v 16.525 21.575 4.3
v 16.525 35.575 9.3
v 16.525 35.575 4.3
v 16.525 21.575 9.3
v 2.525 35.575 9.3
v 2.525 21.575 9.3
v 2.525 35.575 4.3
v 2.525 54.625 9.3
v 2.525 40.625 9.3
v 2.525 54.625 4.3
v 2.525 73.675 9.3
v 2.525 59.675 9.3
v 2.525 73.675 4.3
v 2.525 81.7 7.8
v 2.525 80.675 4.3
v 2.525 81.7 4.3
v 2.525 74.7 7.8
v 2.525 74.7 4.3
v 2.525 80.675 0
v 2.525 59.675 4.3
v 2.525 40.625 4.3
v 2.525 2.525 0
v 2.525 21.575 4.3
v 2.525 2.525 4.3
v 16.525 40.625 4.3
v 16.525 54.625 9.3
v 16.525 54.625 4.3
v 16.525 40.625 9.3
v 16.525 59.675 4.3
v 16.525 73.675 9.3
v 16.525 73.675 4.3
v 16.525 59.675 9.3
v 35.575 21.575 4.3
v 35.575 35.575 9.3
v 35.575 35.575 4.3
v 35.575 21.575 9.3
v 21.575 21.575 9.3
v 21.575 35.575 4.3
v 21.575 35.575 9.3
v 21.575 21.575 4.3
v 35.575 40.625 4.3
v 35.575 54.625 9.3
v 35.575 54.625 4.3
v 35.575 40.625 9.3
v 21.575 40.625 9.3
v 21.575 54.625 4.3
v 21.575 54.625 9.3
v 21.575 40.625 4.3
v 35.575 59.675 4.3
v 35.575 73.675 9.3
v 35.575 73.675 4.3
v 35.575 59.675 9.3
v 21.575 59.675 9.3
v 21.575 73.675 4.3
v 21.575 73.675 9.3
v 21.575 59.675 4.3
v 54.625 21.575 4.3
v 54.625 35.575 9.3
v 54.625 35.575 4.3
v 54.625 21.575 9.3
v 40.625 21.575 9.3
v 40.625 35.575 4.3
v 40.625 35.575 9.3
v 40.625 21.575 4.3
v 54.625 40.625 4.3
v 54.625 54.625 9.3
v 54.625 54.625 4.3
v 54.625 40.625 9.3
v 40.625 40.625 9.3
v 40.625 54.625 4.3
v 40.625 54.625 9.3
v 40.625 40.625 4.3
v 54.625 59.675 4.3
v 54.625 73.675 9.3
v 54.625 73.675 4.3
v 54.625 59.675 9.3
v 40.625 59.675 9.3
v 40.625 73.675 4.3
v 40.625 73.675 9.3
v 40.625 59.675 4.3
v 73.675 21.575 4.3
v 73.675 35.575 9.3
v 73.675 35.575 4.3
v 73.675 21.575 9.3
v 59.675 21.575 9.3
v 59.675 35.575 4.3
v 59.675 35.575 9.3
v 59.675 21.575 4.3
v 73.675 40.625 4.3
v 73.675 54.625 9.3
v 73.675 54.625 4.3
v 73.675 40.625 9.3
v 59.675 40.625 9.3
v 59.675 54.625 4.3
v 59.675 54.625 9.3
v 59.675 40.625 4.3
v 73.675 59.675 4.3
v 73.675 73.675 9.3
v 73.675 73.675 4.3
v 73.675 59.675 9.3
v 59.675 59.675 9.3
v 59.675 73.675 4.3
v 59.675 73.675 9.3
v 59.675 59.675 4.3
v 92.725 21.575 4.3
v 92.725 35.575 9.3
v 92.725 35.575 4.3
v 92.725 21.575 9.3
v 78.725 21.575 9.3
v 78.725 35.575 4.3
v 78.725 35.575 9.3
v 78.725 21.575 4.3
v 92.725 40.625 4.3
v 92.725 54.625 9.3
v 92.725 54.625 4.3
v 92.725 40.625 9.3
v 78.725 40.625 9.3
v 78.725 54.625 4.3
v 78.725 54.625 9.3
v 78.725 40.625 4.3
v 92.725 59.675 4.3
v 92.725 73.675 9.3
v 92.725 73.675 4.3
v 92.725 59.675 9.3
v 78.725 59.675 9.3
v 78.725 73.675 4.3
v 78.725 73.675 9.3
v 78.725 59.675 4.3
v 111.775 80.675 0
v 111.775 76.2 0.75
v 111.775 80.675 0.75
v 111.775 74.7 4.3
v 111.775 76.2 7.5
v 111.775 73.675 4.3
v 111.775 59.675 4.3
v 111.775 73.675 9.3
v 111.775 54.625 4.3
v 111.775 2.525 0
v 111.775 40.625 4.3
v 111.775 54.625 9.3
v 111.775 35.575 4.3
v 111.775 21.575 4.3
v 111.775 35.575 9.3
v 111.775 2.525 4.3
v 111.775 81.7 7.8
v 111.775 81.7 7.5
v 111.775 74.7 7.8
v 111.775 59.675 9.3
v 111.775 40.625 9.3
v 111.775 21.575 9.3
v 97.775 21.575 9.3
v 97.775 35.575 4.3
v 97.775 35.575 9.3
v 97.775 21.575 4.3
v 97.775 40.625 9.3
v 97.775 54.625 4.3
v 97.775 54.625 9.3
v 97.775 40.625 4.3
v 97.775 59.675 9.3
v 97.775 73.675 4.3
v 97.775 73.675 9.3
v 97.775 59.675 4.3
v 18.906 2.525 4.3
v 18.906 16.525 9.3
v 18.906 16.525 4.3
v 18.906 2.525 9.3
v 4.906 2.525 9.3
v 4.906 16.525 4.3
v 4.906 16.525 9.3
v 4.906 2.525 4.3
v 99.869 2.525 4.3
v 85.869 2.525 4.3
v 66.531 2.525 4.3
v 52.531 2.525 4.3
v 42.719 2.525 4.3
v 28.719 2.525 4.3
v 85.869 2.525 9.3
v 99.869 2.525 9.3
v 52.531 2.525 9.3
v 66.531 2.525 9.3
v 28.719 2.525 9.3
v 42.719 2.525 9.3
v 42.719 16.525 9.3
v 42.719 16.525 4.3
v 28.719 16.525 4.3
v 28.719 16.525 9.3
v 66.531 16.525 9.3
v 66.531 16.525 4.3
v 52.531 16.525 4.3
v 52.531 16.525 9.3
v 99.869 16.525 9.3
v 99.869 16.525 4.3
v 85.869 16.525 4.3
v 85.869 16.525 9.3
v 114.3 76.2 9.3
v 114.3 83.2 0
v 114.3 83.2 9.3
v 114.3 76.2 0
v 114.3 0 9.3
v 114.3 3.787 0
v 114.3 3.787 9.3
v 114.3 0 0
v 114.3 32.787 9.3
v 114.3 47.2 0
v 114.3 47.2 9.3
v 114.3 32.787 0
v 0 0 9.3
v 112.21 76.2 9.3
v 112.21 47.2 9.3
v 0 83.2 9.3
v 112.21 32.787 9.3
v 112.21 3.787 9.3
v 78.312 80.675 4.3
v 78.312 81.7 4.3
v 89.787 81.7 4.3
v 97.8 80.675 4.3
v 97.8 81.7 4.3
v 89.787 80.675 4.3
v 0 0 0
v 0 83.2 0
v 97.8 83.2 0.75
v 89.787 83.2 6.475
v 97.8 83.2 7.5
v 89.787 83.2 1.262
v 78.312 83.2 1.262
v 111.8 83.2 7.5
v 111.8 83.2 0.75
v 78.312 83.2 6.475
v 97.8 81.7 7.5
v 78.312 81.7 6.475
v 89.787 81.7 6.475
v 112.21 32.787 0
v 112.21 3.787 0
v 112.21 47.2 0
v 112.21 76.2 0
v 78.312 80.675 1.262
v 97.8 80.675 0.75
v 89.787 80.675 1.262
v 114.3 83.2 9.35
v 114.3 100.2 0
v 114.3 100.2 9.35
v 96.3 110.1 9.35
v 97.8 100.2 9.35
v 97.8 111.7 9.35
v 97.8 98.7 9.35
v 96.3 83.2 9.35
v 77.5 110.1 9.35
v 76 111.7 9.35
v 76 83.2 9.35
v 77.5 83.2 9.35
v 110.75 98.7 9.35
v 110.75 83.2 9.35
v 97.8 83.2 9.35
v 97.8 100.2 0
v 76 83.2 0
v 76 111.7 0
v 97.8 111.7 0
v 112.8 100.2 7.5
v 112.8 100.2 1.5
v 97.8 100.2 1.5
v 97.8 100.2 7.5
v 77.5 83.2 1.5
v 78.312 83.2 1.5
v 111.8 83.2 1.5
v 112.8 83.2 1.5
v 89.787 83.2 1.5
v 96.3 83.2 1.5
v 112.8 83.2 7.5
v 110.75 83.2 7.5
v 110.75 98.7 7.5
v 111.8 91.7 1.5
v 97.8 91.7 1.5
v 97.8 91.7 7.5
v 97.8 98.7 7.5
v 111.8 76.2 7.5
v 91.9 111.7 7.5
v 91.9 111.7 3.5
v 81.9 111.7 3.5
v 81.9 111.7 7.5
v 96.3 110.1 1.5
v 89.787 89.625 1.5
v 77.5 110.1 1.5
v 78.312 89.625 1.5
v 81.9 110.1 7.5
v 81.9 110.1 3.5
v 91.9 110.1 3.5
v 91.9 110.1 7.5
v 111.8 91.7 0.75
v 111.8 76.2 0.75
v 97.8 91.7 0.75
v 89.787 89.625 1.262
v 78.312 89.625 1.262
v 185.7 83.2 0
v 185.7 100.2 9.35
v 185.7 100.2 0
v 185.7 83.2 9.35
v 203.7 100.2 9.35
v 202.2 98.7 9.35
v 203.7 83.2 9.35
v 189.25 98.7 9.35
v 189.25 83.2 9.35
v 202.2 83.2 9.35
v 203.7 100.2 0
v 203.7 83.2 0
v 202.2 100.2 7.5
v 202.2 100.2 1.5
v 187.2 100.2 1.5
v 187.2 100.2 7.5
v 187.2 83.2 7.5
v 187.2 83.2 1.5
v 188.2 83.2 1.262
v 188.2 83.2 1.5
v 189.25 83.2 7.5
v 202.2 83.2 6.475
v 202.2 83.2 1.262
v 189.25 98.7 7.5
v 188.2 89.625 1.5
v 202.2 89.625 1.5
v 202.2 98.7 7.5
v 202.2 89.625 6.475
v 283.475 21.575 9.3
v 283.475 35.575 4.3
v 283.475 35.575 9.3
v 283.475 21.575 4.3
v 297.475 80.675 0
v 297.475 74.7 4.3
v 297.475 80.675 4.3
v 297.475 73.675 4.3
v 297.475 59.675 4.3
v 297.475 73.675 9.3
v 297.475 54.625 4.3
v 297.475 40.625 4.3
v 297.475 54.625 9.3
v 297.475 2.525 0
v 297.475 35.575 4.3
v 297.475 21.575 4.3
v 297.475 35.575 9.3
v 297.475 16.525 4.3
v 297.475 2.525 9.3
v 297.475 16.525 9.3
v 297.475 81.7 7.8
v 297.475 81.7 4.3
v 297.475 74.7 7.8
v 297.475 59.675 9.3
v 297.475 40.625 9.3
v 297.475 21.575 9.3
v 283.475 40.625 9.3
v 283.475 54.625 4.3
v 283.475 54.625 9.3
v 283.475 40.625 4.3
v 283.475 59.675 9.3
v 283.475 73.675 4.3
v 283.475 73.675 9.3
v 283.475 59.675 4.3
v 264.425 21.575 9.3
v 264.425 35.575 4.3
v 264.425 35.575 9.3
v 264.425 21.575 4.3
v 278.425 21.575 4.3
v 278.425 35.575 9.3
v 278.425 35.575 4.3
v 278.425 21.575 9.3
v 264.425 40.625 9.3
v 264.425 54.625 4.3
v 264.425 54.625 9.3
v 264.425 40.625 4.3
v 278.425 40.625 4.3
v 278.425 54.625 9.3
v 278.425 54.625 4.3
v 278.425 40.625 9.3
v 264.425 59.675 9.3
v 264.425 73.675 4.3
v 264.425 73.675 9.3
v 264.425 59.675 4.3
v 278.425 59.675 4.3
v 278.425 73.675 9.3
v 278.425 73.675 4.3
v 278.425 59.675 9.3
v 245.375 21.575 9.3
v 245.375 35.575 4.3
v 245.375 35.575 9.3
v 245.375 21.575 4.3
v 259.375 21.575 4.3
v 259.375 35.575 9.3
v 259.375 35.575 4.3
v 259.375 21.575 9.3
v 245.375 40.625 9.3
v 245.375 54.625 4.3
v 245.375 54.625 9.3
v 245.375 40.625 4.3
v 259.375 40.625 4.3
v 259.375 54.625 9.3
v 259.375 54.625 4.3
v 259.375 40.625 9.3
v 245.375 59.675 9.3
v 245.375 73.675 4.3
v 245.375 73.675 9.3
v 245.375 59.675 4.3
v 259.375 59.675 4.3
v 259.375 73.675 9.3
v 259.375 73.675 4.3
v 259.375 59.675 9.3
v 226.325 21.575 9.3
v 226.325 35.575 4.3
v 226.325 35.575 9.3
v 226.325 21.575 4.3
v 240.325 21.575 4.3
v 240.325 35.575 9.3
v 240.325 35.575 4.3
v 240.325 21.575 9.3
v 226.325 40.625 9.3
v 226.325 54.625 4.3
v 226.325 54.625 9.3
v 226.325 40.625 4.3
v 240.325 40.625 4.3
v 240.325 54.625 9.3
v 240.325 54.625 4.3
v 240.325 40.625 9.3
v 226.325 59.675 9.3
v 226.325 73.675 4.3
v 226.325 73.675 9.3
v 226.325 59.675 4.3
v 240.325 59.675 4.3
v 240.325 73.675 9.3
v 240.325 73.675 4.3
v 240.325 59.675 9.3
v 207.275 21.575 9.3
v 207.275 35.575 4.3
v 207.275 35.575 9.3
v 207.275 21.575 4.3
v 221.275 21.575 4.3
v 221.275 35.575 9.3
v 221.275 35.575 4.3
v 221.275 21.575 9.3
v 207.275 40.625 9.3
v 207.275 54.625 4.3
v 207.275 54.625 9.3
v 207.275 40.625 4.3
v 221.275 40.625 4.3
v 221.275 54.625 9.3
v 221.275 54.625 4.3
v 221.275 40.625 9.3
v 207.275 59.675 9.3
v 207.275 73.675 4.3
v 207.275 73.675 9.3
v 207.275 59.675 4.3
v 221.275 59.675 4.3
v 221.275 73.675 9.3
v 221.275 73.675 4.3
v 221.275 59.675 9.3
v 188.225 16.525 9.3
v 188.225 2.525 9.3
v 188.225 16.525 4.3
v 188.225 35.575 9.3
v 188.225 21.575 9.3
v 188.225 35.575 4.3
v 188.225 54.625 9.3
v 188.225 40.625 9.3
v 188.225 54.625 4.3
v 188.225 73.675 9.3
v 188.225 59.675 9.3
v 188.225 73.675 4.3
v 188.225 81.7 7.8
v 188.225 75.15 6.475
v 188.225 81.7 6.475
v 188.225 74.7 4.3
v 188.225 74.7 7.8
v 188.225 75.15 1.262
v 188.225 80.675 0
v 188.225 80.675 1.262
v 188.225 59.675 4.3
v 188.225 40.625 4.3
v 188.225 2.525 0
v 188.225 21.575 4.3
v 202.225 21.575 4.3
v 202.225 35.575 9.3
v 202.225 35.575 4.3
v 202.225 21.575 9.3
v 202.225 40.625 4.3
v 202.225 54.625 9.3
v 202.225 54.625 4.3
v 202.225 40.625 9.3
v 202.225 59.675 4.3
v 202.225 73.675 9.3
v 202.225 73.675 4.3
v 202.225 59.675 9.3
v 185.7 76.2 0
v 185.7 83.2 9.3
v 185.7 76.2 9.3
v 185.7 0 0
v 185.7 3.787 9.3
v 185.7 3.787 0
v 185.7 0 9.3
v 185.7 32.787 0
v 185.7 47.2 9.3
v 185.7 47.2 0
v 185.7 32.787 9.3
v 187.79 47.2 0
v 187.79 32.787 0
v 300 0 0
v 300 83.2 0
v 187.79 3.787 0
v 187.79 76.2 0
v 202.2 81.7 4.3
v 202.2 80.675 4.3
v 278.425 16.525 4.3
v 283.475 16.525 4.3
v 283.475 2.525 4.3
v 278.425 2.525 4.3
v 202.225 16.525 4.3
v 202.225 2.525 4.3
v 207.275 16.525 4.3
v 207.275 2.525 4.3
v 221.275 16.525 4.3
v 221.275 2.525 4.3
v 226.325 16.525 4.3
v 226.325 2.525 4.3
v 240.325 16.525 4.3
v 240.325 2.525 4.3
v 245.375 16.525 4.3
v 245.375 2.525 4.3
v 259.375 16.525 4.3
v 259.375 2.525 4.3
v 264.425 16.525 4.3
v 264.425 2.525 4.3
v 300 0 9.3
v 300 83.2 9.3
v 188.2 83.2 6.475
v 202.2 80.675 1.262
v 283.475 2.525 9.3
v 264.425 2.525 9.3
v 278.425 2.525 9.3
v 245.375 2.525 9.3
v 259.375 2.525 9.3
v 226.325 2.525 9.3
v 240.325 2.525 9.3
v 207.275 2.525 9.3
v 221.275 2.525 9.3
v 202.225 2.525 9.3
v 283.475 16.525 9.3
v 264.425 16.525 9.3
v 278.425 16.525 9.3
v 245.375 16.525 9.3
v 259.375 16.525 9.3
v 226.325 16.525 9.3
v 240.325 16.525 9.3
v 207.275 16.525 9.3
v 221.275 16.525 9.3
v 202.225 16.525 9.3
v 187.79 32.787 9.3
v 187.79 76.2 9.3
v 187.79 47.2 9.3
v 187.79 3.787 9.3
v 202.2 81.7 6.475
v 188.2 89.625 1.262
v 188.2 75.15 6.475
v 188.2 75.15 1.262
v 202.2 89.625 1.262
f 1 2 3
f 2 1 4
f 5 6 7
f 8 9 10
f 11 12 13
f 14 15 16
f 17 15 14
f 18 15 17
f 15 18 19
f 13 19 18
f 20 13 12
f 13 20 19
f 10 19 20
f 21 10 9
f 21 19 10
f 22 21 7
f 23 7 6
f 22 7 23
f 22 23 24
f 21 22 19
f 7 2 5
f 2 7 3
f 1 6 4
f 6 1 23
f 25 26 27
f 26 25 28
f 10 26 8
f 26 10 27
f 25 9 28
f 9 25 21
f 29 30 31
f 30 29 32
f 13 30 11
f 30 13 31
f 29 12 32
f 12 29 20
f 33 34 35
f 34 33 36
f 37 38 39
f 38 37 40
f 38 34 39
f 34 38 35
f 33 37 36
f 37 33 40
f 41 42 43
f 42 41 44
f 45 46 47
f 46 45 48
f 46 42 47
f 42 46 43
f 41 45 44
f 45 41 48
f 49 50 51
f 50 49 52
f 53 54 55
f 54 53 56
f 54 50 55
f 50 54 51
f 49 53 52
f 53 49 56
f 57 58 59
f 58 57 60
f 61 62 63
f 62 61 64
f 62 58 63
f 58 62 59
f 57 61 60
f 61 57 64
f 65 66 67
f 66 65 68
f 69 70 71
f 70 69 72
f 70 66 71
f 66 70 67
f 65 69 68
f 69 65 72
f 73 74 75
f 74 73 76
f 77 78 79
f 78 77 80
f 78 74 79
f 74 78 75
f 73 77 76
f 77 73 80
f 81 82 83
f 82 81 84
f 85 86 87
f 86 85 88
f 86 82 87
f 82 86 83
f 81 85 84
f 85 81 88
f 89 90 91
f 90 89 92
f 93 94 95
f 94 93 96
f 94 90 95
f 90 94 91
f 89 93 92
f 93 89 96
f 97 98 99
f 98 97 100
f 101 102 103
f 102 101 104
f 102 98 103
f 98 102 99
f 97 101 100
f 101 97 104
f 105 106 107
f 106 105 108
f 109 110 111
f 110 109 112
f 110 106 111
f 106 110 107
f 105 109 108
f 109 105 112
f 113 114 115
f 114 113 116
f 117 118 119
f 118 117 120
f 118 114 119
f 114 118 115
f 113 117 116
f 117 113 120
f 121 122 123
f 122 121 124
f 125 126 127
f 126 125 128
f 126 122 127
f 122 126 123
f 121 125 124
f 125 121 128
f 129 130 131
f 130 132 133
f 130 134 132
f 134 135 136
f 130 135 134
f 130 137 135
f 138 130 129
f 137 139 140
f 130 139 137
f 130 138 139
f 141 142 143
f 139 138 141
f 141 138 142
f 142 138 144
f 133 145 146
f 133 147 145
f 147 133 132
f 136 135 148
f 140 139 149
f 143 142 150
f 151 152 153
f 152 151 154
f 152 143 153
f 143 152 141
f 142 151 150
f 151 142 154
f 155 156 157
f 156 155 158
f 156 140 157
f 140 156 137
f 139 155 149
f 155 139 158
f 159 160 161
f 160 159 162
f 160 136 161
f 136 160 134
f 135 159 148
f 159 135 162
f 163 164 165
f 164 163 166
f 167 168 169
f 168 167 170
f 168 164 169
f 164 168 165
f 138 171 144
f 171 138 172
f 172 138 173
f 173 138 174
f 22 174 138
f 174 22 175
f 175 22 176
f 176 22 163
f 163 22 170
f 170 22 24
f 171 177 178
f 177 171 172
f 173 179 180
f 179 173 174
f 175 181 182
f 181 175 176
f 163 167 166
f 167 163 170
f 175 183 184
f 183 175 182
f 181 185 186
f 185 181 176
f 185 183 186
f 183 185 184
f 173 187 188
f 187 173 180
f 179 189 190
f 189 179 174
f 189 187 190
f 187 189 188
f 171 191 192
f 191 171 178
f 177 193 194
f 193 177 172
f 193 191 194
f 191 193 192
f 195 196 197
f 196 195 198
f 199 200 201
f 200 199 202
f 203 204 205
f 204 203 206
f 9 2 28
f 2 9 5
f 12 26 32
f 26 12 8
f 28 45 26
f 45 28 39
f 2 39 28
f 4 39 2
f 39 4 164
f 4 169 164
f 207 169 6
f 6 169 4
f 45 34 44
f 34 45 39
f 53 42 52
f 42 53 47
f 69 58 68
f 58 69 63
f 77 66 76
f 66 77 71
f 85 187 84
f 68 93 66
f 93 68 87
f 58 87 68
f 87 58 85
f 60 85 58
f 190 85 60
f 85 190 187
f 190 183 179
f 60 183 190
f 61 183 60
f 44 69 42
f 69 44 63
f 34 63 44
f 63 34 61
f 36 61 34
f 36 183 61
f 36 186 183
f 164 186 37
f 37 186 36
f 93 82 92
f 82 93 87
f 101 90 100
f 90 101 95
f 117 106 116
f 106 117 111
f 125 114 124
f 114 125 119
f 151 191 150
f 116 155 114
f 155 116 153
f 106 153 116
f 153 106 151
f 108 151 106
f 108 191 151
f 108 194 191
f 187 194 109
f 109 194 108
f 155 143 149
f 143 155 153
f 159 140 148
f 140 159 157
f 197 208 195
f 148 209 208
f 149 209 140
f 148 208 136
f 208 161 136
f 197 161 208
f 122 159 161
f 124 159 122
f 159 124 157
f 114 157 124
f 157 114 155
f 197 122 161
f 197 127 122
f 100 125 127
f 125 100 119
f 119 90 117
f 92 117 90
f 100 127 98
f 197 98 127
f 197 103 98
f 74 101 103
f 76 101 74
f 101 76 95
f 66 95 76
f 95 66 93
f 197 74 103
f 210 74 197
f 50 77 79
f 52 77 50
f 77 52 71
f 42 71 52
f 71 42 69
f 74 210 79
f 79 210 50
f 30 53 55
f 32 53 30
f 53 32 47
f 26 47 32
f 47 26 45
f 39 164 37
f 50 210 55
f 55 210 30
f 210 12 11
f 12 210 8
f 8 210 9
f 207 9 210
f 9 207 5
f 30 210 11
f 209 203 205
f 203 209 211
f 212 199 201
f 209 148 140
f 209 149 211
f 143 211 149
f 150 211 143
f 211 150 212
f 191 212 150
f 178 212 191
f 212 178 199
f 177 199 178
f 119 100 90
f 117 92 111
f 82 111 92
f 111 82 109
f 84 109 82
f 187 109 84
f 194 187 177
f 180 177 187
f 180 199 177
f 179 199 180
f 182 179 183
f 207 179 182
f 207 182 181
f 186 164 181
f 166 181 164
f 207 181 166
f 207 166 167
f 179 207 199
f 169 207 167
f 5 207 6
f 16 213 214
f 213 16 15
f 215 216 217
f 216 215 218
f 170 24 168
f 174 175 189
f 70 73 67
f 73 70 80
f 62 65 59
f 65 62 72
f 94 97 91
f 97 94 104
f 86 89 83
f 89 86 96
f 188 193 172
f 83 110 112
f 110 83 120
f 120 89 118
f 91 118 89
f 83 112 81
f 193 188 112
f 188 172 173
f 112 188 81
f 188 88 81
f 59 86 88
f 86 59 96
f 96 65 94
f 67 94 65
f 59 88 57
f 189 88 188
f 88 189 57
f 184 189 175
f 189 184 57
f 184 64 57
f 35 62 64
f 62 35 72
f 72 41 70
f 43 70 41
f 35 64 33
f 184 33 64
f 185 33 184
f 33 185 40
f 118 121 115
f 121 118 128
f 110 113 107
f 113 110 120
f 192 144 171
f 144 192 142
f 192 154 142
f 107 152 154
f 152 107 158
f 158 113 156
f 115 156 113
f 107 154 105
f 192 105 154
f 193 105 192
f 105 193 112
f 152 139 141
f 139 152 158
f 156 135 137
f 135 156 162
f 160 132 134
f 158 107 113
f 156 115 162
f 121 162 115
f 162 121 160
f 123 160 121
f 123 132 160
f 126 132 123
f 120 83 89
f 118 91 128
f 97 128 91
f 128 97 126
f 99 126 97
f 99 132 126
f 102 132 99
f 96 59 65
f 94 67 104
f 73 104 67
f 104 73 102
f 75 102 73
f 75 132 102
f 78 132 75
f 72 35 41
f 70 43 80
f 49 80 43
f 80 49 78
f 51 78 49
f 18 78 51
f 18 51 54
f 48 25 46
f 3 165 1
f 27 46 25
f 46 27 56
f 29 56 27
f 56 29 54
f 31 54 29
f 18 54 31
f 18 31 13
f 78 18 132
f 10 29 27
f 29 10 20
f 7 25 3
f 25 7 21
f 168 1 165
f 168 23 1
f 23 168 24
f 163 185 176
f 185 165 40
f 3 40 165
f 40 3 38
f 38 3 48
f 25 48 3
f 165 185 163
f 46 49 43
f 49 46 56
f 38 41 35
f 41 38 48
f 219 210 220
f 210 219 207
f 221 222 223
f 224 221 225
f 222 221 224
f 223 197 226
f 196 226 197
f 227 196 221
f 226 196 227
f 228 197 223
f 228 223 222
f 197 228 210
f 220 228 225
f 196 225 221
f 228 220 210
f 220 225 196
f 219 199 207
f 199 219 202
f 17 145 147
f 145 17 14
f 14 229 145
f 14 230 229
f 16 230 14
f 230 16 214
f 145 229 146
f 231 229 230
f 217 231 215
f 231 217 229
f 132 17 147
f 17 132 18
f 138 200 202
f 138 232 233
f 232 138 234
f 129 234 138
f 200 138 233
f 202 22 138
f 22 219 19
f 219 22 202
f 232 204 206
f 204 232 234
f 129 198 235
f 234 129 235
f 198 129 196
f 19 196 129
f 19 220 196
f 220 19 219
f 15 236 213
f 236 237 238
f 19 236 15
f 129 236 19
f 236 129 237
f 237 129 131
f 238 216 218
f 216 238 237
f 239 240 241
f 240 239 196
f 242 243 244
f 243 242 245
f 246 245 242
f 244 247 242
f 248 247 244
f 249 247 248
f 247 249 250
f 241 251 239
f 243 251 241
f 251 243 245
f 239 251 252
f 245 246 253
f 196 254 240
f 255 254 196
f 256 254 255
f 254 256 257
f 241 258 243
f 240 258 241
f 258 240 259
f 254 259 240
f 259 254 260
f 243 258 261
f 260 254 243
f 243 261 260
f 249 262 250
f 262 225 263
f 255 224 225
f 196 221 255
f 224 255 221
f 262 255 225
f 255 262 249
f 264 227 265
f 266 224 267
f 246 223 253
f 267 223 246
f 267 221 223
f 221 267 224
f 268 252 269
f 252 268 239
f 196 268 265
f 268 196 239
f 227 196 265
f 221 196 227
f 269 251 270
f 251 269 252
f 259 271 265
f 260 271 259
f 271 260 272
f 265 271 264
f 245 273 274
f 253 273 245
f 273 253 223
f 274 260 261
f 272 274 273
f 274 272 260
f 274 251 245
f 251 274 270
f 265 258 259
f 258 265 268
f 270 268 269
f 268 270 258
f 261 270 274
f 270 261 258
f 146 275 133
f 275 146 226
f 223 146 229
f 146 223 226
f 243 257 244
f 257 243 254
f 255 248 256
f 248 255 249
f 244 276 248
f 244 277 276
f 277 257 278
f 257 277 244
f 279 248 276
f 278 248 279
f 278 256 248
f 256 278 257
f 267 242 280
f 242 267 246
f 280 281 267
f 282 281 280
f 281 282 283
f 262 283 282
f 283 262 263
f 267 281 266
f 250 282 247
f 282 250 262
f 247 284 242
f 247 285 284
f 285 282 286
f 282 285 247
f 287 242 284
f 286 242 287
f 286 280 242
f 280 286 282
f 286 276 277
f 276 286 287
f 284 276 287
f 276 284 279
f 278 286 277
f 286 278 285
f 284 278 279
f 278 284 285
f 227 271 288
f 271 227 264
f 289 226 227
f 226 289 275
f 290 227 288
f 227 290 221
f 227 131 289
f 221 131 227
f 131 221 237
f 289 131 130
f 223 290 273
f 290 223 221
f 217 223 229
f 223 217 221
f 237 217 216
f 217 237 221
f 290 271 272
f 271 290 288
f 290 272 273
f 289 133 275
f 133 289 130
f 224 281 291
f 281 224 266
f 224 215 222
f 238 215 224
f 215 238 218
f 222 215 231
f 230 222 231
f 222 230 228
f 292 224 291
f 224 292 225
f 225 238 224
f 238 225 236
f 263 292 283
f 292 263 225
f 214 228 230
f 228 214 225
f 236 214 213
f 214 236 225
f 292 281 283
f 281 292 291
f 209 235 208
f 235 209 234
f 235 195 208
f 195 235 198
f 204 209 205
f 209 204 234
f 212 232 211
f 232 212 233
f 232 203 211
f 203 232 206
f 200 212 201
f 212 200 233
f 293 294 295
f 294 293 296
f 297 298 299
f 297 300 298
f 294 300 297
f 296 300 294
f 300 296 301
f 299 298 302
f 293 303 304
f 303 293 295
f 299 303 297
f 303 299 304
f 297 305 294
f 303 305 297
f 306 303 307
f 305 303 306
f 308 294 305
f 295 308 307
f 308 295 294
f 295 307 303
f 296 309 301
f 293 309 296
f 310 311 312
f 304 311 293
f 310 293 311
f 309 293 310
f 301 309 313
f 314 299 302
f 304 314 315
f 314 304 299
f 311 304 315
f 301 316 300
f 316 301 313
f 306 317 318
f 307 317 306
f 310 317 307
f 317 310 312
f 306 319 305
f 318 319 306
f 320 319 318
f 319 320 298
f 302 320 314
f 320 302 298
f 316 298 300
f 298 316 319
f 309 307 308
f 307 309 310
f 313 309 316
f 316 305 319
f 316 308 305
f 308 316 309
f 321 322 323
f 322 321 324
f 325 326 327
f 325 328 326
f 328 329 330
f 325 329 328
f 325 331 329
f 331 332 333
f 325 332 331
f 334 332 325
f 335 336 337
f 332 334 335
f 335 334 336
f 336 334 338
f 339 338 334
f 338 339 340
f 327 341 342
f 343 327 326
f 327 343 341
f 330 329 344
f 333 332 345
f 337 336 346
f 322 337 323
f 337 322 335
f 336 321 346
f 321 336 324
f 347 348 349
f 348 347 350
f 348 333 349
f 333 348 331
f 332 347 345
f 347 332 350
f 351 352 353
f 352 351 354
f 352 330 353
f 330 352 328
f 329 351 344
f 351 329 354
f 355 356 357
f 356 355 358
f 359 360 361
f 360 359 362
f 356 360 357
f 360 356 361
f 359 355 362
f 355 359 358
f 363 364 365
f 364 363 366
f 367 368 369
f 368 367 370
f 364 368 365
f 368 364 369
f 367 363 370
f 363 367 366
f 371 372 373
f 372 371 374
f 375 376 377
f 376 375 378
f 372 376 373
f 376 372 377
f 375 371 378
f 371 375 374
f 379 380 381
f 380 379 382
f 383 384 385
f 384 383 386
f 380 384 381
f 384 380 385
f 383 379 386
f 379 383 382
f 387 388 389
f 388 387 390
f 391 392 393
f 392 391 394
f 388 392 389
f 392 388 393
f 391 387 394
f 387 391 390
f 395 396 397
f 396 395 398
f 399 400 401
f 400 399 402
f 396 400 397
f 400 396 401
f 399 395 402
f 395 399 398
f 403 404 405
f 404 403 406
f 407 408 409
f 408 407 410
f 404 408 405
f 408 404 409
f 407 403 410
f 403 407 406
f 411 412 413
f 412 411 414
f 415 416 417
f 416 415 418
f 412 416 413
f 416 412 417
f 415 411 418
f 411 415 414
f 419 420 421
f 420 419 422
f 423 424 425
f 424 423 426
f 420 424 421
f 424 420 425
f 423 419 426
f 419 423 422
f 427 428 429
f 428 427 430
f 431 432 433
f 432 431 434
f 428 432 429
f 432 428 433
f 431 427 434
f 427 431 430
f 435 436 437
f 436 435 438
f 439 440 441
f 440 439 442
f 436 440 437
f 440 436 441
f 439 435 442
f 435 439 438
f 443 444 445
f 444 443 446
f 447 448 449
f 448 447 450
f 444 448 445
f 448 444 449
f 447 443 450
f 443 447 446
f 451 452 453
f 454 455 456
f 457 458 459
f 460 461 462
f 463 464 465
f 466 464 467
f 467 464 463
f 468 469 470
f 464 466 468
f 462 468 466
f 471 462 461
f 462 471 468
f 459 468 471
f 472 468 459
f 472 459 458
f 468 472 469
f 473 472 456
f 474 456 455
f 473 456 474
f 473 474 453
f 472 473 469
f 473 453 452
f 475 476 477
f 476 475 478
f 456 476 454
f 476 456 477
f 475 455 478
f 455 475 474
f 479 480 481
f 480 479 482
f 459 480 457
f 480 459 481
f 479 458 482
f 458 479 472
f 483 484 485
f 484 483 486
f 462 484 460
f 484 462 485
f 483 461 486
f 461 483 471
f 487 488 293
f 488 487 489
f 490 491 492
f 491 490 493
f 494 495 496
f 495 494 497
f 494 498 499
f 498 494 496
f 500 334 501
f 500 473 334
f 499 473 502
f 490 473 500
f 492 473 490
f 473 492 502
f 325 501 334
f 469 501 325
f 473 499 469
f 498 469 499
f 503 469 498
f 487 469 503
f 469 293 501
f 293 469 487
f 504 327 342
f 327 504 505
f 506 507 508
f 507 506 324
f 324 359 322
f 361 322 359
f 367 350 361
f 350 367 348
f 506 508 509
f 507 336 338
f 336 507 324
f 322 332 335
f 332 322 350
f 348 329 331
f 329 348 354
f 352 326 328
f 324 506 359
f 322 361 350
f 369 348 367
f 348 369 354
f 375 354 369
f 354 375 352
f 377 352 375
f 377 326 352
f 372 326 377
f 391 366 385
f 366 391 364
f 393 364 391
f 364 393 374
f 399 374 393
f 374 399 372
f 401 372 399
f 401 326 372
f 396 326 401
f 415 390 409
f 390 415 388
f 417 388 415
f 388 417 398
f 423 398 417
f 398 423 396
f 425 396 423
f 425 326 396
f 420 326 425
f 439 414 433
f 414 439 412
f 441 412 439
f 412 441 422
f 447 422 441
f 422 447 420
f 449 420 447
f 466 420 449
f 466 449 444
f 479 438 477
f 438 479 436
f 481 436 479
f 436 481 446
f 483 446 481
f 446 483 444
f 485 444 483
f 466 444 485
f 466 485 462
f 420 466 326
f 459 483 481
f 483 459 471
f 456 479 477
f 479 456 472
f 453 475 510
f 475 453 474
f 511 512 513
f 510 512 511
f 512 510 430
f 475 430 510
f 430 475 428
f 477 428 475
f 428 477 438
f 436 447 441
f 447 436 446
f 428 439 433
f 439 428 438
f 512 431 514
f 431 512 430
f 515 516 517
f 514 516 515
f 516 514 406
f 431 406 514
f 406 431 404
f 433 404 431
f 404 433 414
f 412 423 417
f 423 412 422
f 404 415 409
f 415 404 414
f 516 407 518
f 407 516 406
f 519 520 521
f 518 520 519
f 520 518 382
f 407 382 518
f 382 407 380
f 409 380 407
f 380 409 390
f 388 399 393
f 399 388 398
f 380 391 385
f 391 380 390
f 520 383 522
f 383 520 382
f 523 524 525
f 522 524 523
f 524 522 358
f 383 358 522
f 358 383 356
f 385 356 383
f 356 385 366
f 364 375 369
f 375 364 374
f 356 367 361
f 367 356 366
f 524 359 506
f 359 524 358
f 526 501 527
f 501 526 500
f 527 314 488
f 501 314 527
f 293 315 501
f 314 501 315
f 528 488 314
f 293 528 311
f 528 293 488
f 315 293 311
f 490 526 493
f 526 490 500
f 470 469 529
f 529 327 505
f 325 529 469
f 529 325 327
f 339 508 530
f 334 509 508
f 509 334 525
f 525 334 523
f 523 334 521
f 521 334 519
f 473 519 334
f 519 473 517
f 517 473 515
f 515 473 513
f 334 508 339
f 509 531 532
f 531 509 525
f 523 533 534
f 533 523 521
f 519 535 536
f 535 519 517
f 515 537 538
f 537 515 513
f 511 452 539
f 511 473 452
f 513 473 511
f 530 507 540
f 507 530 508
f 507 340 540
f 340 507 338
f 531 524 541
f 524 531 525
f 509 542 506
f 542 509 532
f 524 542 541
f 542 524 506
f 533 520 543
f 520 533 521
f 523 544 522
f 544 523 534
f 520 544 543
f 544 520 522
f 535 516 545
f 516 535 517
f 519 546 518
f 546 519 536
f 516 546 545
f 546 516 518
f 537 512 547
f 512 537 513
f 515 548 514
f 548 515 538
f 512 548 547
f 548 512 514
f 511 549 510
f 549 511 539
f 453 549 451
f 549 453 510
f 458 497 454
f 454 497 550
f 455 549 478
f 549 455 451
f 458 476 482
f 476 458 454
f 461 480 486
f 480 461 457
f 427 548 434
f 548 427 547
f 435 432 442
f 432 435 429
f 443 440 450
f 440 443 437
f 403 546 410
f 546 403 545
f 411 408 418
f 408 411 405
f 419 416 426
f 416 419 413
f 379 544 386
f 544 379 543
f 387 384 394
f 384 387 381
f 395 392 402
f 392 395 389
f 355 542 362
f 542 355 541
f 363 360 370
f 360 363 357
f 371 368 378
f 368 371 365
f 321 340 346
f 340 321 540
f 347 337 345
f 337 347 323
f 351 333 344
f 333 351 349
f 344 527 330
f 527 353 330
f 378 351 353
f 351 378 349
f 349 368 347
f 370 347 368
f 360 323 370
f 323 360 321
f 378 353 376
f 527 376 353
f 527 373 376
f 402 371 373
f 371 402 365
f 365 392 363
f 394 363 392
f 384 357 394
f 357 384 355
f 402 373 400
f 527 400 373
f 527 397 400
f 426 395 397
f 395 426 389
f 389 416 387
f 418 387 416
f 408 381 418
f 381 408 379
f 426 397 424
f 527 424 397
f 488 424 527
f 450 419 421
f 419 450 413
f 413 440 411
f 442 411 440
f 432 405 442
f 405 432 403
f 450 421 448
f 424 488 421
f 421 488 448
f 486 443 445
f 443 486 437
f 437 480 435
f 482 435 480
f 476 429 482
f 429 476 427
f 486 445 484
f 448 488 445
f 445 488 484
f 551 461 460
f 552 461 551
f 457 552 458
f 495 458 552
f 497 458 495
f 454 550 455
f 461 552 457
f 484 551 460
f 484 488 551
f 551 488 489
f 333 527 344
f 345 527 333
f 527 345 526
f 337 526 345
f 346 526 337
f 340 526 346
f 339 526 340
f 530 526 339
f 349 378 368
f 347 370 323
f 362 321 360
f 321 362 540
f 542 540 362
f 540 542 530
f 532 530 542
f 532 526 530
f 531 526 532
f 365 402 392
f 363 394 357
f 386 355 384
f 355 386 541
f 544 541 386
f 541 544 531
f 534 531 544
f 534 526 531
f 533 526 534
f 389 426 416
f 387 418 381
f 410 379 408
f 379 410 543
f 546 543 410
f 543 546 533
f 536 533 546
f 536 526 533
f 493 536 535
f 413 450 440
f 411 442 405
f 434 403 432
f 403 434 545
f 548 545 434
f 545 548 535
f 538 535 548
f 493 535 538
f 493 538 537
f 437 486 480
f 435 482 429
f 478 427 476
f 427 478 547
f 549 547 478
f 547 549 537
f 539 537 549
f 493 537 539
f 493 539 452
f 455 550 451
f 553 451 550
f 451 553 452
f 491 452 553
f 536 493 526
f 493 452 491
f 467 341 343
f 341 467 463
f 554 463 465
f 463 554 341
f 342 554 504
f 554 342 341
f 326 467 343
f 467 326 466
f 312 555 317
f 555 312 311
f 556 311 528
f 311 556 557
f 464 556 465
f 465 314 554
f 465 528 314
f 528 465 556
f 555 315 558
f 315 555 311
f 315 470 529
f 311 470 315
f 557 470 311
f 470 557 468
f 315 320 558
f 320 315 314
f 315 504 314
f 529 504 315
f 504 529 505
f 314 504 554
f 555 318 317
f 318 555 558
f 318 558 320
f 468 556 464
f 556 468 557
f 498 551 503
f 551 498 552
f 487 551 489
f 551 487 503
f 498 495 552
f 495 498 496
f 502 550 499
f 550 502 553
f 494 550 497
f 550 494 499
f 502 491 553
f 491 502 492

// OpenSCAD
$fa = 1;
$fs = 0.4;

print = false;  // may be redefined at command line


// right now, let's make a printable "slab" where I can insert the keys and put on keycaps to see if they fit.

// spacing: https://null-src.com/posts/keyboard-design-cheatsheet/
// apparently, 1u = 19.05mm

key_size = 14;
unit = 19.05;
key_pin = 3.3;  // from ref.
key_body = 5;
key_underside = key_pin + key_body;
key_off = (unit - key_size) / 2;

max_key_with_keycap_exact_height = 18;  // in mm. based on OEM num keys.
pressed_key_height = 11;  // close enough.
exposed_switch_height = 6;  // close enough
slump = exposed_switch_height;  // not sure how much to lower the keyboard plane. this variable tracks it.

// 2 parts. these numbers refer to one part.
keys_in_row = 6;
keys_in_column = 4;  // NOTE: last column is different.

use_width = keys_in_row * unit;
use_height = keys_in_column * unit;

cable_zone_height = 7;

off = 0;  // random offset, so that the part "sticks"

// if i decide to make the keyboard angled, this would be it.
key_plane_angle = 0;

avg_depth = 5;
cut_depth = 2;  // cutting shit


function sum(l, i = 0) =
    i < len(l)
        ? l[i] + sum(l, i + 1)
        : 0;

function slice(l, from, to) =
    to != undef  // HACK: if to is undefined, then we assume 'from' is actually 'to' and from is 0.
        ? to >= from  // when range is empty, make empty list yo.
            ? [for (i = [from : to]) l[i]]
            : []
        : slice(l, 0, from);

module key_plane_cutouts(edge_off, last_line) {
    key_begin = (unit - key_size) / 2;
    for (x = [key_begin : unit : use_width]) {
        // ignore closest key line
        for (y = [key_begin + unit : unit : use_height]) {
            translate([x + edge_off, y + edge_off, -cut_depth/2]) cube([key_size, key_size, avg_depth + cut_depth]);
        }
    }

    // add later lines
    last_line_units = [for (s = last_line) s * unit];
    for (i = [0 : len(last_line_units) - 1]) {
        spacing_until_now = sum(slice(last_line_units, i - 1));
        spacing = last_line_units[i];

        key_off = (spacing - key_size) / 2;

        x = edge_off + spacing_until_now + key_off;
        y = edge_off + key_begin;
        translate([x, y, -cut_depth/2]) cube([key_size, key_size, avg_depth + cut_depth]);
    }
}

module test_key_grid() {
    key_begin = (unit - key_size) / 2;
    for (x = [key_begin : unit : use_width]) {
        for (y = [key_begin : unit : use_height]) {
            translate([x + off, y + off, -cut_depth/2]) cube([key_size, key_size, avg_depth + cut_depth]);
        }
    }
   
}

module key_plane(edge_off, last_line) {
    part_width = use_width + 2*edge_off;
    height = use_height + 2*edge_off + cable_zone_height;
    difference() {
        cube([part_width, height, avg_depth]);
        
        key_plane_cutouts(edge_off, last_line);
        translate([key_off, height - cable_zone_height - conn_off, -conn_off]) cube([use_width - 2*key_off, cable_zone_height, avg_depth]);

        // right part.
        // key_plane([1.75, 1.25, 1, 1, 1, 1]);
    }
}


module flip_z() {
    scale([1, 1, -1]) children();
}

module flip_y() {
    scale([1, -1, 1]) children();
}

module flip_x() {
    scale([-1, 1, 1]) children();
}

module id() {
    children();
}

// half function half comment. used to mean that we cut FAR.
function farcut(x) =
    x != undef
        ? x + 1000
        : 1000;


rp_width = 24;
rp_height = 18.8;
rp_more = 3;  // elongate the thing, so you can put in the rpi easier.
usbc_width = 7;
usbc_height = 9 + 1;  // measured + error
usbc_z = 3 + 1;
rp_off = 1.5;

module rp2040() {
	cube([rp_width, rp_height, 1]);
	translate([-2, (rp_height  - 9) / 2, 1]) cube([usbc_width, usbc_height, usbc_z]);
}

wall_thickness = 10;
plane2ground = key_underside + 5;  // 5mm added to approximate the actual size of this keyboard.
front_back_wall_height = max_key_with_keycap_exact_height - slump;
left_right_wall_height = front_back_wall_height * 2;
max_height = plane2ground + left_right_wall_height;  // for now! we're not including the bottom layer yet.
echo("max height: ", max_height);
connection_off = 0;  // for connections with surrounding wall. not needed now.
extra = 1;
wall_down = key_underside - key_body + extra;

module part() {
			// keys
	    translate([0, 0, wall_down]) {
				children();

				// wallz
				flip_z() difference() {
					cube([use_width, use_height + cable_zone_height, wall_down]);

					translate([key_off, key_off, -.1]) cube([use_width - 2*key_off, use_height + cable_zone_height - 2*key_off, farcut()]);
				}
			}
}


pin = 3;  // got by measuring
conn_width = 5 * pin;
conn_height = 2 * pin;
conn_min_depth = 12;
conn_off = 1.5;

all_height = wall_down + 2*key_off;  // NOTE: does not make sense at all. it's my shitty coding, because I didn't bother to look through the code now.
thing_width = conn_width + 2 * conn_off;
thing_height = conn_height + 2 * conn_off;
thing_z = conn_min_depth + 5;

magnet_length = 28 + 1;
magnet_thickness = 2 + .1;  // minimal error - we are operating on scraps. very thin walls.
magnet_height = 9 + 1;

extra_off = 0;

module left_part() {
		difference() {
			id () {
		    part() key_plane(connection_off, [1.25, 1.25, 1.25, 2.25]);

				// magnet thing
				// magnet_thing_length = thing_z + cable_zone_height + key_off;
				// translate([use_width - extra_off, use_height - key_off, 0]) {
				// 	cube([extra_off, magnet_thing_length, all_height + 5]);
				// }


				// connector part
				translate([use_width - thing_width - extra_off, use_height + cable_zone_height, 0]) {
					difference() {
						cube([thing_width, thing_z, max(thing_height, all_height)]);

						// main shaft
						translate([conn_off, 0, conn_off]) cube([thing_width - 2*key_off, thing_z - conn_off, farcut()]);

						// pinout
						translate([conn_off, 0, conn_off]) cube([thing_width - 2*conn_off, farcut(), thing_height - 2*conn_off]);
					}
				}

				// arduino part
				rpp_width = rp_height + 2*rp_off;
				rpp_height = rp_width + rp_more + rp_off;
				translate([use_width - thing_width - rpp_width + rp_off - extra_off, use_height + cable_zone_height, 0]) {
					difference() {
						id() {
							cube([rpp_width, rpp_height, max(usbc_z + rp_off + 2 + rp_off, all_height)]);
						}

						// top shaft
						translate([rp_off, -.1, rp_off]) cube([rpp_width - 2*rp_off, rpp_height - rp_off, farcut()]);

						// usbc cutout
						translate([(rpp_width - usbc_height) / 2, 10, rp_off + 2]) cube([usbc_height, farcut(), usbc_z]);

						// main shaft
						// translate([key_off, 0, key_off]) cube([rpp_width - 2*key_off, rpp_height - key_off, farcut()]);

						// pinout
						// translate([key_off, 2*key_off, key_off]) cube([thing_width - 2*key_off, thing_z - key_off, thing_height - 2*key_off]);
					}
				}
			}

			// cut between wire connector and keyboard
			translate([use_width - thing_width + conn_off - extra_off, use_height + cable_zone_height - 2*conn_off - 4, conn_off - conn_off/2]) cube([key_size, thing_z - conn_off, thing_height - 2*conn_off + conn_off/2]);

			// rp - keyboard
			translate([use_width - thing_width - key_off/2 + key_off - .2 - unit - extra_off, use_height + cable_zone_height - 2*key_off - 3, key_off - key_off/2]) cube([key_size - key_off, thing_z - key_off, thing_height - 2*key_off + key_off/2]);

			// magnet hollow outs
			// NOTE: the magnet is as tall as the keyboard, so I'll do a vertical cut.
			// the magnet should be glued to it.
			translate([use_width - extra_off - magnet_thickness + 0.01, use_height - magnet_length, -0.01]) {
				cube([magnet_thickness, magnet_length, magnet_height]);
			}

			translate([use_width - extra_off - magnet_thickness + 0.01, key_off + key_off/2, -0.01]) {
				cube([magnet_thickness, magnet_length, magnet_height]);
			}
		}
}

module right_part() {
    flip_x() {
		difference() {
			id() {
		 part() key_plane(connection_off, [1, 1, 1, 1, 1, 1]);  // funny hack. i simply reversed the last line keys in a list and it works :3
		  
				// connector part
				translate([use_width - thing_width, use_height + cable_zone_height, 0]) {
					difference() {
						cube([thing_width, thing_z, max(thing_height, all_height)]);

						// main shaft
						translate([conn_off, 0, conn_off]) cube([thing_width - 2*key_off, thing_z - conn_off, farcut()]);

						// pinout
						translate([conn_off, 0, conn_off]) cube([thing_width - 2*conn_off, farcut(), thing_height - 2*conn_off]);
					}
				}
			}

			// cut between wire connector and keyboard
			translate([use_width - thing_width + conn_off, use_height + cable_zone_height - 2*key_off - 3, key_off - key_off/2]) cube([key_size, thing_z - key_off, thing_height - 2*key_off + key_off/2]);

			
			// magnet hollow outs
			// NOTE: the magnet is as tall as the keyboard, so I'll do a vertical cut.
			// the magnet should be glued to it.
			translate([use_width - extra_off - magnet_thickness + 0.01, use_height - magnet_length, -0.01]) {
				cube([magnet_thickness, magnet_length, magnet_height]);
			}

			translate([use_width - extra_off - magnet_thickness + 0.01, key_off + key_off/2, -0.01]) {
				cube([magnet_thickness, magnet_length, magnet_height]);
			}

		}

	}
}

// crap
module third_leg() {
	shit_d = avg_depth - 1;
	shit_d2 = avg_depth + 3;
	offff = -.7;
	w = 9;
	wtf = 2.5;
	translate([3, use_height - 4 + offff, 0]) cube([w, w, shit_d]);
	translate([3, use_height + 2 + offff - wtf, 0]) cube([w, w - 6 + wtf, shit_d2]);
}

// BOB_SCAD_PRINT left_part right_part third_leg
if (!print) {
    left_part();
    translate([300, 0, 0]) right_part();
}
